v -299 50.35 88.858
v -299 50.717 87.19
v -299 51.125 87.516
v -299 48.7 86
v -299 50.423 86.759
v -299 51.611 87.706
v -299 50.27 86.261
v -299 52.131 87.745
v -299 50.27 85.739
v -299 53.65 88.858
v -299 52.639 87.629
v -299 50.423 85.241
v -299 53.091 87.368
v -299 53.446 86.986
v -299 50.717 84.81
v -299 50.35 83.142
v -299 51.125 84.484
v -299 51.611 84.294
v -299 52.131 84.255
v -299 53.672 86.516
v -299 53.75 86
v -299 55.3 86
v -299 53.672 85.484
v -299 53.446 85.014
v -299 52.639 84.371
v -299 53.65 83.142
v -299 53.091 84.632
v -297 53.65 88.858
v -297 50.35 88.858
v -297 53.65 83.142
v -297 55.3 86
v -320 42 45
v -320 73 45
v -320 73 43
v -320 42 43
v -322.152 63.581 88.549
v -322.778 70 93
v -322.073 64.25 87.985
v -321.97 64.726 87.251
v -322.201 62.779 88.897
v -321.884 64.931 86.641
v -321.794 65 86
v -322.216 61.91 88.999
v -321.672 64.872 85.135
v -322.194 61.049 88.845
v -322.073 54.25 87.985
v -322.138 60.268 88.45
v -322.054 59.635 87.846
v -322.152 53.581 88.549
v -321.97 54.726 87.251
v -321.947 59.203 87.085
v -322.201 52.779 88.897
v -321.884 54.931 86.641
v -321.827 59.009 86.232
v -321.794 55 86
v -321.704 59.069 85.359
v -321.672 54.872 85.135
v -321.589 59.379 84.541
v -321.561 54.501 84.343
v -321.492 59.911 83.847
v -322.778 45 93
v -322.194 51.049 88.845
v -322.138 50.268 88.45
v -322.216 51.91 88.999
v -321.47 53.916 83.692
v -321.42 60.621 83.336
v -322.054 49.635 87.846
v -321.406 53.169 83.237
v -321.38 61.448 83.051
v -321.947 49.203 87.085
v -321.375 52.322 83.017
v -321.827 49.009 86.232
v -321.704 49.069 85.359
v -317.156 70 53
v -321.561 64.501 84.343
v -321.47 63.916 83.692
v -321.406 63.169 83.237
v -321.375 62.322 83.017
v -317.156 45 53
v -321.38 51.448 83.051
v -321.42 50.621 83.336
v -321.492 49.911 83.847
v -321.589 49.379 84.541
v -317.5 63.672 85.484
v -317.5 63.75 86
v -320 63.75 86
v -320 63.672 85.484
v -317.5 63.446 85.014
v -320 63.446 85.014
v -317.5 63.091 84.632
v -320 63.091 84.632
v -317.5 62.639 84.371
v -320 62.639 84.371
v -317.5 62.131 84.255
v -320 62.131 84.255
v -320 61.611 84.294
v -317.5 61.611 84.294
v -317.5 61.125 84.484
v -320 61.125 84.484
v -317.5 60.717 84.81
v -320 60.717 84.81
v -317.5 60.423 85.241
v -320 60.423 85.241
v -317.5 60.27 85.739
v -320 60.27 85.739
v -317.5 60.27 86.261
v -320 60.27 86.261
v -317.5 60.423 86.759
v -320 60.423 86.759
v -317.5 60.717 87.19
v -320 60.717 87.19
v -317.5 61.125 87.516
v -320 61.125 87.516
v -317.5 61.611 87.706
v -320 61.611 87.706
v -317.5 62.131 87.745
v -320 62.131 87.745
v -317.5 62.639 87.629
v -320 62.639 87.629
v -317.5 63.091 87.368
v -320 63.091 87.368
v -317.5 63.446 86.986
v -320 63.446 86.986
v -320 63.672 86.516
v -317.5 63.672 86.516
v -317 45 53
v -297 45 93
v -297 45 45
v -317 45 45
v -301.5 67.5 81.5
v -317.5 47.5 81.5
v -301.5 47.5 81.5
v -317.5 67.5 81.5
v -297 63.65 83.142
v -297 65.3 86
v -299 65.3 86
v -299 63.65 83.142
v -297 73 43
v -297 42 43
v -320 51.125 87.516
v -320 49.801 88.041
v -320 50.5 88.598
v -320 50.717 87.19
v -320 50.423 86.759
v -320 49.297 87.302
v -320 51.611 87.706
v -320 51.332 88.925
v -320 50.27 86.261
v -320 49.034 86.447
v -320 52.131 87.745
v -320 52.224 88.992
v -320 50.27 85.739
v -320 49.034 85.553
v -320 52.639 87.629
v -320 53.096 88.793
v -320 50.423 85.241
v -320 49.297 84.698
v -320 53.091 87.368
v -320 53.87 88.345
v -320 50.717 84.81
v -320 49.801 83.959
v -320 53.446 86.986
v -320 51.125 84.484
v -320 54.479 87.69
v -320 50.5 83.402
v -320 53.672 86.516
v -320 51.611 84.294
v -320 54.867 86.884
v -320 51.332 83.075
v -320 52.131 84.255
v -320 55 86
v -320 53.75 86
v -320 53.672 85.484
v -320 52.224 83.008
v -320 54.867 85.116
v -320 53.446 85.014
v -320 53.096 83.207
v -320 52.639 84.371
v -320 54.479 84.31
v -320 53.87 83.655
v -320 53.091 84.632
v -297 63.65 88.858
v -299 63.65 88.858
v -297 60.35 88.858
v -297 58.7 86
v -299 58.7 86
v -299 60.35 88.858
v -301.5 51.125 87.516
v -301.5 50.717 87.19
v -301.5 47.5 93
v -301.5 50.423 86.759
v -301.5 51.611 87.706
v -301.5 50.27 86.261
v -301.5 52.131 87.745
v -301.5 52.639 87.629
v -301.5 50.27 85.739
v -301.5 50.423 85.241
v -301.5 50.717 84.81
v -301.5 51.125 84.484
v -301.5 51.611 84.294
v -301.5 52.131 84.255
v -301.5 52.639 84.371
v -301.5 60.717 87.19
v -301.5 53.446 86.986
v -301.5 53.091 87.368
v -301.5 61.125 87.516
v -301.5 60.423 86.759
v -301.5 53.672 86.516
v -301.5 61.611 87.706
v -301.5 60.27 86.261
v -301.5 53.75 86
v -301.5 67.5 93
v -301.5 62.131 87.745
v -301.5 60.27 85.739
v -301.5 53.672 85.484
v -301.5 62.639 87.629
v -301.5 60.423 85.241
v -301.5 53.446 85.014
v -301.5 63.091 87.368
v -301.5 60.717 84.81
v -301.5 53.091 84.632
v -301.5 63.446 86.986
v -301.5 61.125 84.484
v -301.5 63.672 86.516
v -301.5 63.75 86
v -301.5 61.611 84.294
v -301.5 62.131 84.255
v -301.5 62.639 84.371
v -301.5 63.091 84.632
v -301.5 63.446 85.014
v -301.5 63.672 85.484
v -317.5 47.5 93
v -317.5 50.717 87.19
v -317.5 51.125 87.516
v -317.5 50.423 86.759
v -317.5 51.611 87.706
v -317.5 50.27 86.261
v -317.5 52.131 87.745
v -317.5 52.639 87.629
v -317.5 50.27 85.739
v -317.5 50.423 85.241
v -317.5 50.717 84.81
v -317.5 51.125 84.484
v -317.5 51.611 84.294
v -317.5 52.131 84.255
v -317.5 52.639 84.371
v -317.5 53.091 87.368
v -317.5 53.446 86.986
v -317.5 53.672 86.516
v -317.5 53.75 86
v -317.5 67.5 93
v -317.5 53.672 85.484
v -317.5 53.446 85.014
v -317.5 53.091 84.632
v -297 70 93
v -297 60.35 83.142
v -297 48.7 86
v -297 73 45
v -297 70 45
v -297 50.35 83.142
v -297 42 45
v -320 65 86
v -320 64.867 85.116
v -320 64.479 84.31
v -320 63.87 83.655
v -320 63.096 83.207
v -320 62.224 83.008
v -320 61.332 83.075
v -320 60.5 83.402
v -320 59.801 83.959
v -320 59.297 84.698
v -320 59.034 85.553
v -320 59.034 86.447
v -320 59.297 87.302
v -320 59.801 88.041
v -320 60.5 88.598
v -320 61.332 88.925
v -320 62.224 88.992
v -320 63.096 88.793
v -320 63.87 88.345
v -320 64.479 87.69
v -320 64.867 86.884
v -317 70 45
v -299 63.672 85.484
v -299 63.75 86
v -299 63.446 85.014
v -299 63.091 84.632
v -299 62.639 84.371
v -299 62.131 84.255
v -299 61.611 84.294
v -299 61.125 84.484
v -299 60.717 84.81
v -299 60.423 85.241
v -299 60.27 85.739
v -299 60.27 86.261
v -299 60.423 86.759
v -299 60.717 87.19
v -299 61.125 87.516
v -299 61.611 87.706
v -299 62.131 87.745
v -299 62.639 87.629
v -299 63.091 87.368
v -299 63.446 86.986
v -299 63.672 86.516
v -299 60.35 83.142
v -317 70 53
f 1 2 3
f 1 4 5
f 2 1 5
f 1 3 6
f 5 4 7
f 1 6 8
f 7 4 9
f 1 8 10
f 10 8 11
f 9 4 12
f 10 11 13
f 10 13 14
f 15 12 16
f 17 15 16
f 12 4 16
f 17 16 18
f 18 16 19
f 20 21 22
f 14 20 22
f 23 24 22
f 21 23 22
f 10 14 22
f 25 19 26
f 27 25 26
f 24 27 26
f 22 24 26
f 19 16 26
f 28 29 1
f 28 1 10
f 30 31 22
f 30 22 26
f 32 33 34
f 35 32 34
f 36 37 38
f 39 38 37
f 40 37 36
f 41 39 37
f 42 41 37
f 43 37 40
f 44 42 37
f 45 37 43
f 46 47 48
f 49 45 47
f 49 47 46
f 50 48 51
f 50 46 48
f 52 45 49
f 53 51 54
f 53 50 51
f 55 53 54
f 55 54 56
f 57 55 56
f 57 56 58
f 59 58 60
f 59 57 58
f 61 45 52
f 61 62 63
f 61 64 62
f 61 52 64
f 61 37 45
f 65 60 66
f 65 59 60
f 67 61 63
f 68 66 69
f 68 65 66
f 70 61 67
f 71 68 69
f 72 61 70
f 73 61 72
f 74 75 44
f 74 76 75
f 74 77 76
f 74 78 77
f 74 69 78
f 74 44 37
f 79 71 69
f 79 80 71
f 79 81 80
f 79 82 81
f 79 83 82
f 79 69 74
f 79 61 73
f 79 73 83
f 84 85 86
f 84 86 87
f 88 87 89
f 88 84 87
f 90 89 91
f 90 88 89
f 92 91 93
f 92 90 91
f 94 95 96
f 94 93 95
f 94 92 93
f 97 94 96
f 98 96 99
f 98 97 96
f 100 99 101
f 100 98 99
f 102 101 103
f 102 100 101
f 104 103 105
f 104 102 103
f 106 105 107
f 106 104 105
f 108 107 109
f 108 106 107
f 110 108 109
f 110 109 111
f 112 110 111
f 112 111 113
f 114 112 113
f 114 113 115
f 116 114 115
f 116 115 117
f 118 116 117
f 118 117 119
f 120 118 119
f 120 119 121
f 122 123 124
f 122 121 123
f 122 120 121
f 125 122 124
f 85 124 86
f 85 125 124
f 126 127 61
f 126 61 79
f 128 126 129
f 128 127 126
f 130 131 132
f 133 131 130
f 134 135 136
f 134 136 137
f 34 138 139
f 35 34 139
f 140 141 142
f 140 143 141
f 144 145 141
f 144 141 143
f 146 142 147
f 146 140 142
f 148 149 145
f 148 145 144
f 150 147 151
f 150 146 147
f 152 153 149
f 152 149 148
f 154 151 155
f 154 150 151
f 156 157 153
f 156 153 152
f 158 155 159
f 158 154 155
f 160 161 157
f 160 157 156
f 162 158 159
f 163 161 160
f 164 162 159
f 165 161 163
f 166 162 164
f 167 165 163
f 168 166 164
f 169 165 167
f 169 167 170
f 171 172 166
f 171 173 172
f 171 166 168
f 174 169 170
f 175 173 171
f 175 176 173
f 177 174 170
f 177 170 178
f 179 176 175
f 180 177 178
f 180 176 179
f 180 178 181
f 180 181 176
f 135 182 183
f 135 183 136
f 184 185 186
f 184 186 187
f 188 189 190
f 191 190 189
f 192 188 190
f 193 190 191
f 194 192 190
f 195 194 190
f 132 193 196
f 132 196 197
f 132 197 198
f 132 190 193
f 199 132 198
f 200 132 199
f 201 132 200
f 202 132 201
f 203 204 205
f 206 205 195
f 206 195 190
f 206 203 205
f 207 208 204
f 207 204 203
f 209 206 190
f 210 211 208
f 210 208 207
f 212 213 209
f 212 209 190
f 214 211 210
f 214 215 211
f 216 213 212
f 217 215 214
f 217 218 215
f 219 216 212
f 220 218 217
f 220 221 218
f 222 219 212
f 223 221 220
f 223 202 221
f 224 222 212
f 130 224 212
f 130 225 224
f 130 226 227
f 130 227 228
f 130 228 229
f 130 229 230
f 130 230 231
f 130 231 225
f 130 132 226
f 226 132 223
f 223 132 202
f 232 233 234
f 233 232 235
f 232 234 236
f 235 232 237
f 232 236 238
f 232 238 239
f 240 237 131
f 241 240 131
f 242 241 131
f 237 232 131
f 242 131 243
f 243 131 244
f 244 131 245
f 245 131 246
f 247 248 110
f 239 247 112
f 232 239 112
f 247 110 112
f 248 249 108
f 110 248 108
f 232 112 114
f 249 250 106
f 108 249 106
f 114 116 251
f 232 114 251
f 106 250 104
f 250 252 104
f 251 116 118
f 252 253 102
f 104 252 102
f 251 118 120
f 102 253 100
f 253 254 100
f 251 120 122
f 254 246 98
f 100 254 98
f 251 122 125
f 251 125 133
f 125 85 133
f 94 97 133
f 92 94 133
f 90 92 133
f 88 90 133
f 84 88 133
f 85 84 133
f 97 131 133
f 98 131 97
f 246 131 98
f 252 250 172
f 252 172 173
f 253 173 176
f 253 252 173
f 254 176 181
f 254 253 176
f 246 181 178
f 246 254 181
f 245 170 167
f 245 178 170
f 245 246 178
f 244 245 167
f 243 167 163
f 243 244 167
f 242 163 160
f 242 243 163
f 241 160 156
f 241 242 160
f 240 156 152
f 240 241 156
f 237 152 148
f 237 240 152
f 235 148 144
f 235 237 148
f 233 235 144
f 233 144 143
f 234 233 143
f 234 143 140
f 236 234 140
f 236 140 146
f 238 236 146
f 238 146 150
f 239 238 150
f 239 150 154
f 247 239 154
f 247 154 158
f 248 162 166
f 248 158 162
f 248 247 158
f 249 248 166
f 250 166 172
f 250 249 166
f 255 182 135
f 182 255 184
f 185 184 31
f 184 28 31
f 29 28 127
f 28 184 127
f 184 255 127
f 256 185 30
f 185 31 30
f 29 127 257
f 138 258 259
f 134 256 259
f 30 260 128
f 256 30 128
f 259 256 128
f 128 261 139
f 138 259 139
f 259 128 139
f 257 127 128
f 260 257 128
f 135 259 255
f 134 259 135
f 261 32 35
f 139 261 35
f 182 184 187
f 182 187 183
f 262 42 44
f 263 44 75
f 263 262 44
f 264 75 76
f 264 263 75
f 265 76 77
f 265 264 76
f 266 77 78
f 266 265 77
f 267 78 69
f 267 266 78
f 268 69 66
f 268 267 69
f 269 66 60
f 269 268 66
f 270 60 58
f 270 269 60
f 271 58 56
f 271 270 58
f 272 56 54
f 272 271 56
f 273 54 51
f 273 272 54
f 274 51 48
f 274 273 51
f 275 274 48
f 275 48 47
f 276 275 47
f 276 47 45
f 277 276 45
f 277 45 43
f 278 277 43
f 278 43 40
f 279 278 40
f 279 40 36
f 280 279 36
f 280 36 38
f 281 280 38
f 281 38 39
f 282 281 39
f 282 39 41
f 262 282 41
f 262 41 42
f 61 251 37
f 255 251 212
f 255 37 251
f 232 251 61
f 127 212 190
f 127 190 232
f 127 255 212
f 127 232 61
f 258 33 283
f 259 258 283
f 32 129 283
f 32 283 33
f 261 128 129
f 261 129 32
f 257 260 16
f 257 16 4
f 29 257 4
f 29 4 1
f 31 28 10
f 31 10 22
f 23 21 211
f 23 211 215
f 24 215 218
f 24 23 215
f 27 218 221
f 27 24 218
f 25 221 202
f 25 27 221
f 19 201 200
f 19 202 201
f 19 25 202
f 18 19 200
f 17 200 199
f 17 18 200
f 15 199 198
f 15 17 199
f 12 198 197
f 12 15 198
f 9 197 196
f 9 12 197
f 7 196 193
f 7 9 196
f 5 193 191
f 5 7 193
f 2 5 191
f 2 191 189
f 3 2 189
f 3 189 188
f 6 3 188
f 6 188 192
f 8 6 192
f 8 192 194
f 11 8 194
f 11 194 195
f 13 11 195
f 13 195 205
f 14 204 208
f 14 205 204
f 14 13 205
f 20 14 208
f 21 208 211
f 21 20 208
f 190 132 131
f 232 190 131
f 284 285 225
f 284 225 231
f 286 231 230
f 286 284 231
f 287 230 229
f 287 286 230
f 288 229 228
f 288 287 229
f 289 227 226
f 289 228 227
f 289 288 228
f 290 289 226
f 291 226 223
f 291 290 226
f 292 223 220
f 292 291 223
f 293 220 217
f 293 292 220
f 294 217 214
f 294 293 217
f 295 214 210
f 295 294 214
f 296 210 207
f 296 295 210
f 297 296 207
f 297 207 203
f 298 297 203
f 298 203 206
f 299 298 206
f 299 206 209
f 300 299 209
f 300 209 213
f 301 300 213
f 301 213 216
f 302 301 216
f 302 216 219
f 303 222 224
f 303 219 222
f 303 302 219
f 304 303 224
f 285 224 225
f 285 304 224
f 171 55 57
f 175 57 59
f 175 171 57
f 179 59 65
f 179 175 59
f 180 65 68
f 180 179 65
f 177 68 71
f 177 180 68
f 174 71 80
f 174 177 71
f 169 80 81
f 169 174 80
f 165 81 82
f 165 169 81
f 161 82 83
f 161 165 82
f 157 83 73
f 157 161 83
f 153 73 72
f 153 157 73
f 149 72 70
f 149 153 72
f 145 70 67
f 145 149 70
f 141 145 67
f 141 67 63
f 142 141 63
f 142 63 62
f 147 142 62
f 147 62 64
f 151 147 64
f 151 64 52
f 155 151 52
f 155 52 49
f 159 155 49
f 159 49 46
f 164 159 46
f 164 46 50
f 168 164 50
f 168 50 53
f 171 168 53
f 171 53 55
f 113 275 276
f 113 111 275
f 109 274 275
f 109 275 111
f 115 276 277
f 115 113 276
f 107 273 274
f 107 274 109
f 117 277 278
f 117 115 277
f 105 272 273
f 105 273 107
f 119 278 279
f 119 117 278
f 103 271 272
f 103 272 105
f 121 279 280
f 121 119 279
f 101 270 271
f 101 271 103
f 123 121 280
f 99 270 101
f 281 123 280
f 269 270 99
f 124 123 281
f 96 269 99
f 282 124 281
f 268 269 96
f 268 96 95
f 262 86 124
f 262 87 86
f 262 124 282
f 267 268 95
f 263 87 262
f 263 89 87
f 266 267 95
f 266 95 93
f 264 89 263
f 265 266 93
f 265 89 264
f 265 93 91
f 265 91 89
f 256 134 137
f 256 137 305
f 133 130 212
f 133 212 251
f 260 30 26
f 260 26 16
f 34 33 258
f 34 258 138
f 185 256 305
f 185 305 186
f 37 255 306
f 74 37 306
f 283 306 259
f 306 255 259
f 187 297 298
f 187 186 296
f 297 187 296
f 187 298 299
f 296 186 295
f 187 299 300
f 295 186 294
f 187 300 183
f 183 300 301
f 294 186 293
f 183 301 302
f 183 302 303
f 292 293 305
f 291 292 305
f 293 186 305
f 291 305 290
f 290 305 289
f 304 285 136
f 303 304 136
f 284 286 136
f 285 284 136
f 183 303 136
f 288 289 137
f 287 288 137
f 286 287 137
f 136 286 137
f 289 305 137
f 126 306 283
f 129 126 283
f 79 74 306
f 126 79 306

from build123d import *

# Parameters (mm, degrees)
PRISM008_DEPTH            = 10
PRISM008_ROLL_ANGLE       = -90
CYLINDER111_R             = 3
CYLINDER111_DEPTH         = 32
CYLINDER111_ROLL_ANGLE    = -90
CYLINDER112_R             = 3
CYLINDER112_DEPTH         = 32
CYLINDER112_ROLL_ANGLE    = -90
BOX117_W                  = 20
BOX117_H                  = 16
BOX117_DEPTH              = 28
CYLINDER113_R             = 1.75
CYLINDER113_DEPTH         = 32
CYLINDER113_ROLL_ANGLE    = -90
CYLINDER114_R             = 1.75
CYLINDER114_DEPTH         = 32
CYLINDER114_ROLL_ANGLE    = -90
PRISM007_DEPTH            = 10
PRISM007_ROLL_ANGLE       = -90
FUSION079_ROLL_ANGLE      = 90
FUSION079_PLACEMENT_ANGLE = 180
BOX115_W                  = 2
BOX115_H                  = 23
BOX115_DEPTH              = 3
BOX110_W                  = 50
BOX110_H                  = 25
BOX110_DEPTH              = 20
BOX114_W                  = 2
BOX114_H                  = 25
BOX114_DEPTH              = 3
BOX113_W                  = 10
BOX113_H                  = 25
BOX113_DEPTH              = 10
BOX112_W                  = 30
BOX112_H                  = 30
BOX112_DEPTH              = 30
BOX112_PITCH_ANGLE        = 90
BOX111_W                  = 50
BOX111_H                  = 25
BOX111_DEPTH              = 6
BOX111_PITCH_ANGLE        = 8
FUSION077_PLACEMENT_ANGLE = -90
BOX116_W                  = 2
BOX116_H                  = 23
BOX116_DEPTH              = 3
CUT138_ROLL_ANGLE         = 90
CUT138_PLACEMENT_ANGLE    = -90


with BuildPart() as prisma008:
    # Prism008 → Prism008 (new body)
    with BuildSketch(Plane.XY):
        Polygon((3.3, 0), (1.65, 2.857884), (-1.65, 2.857884), (-3.3, 0), (-1.65, -2.857884), (1.65, -2.857884), align=None)
    extrude(amount=PRISM008_DEPTH)


with BuildPart() as prisma008_1:
    # Prism008 roll: moved
    add(prisma008.part.rotate(Axis((0, 0, 0), (1, 0, 0)), PRISM008_ROLL_ANGLE))


with BuildPart() as prisma008_2:
    # Prism008 placement: moved
    add(prisma008_1.part.moved(Location((8, 85, 84))))


with BuildPart() as cilindro038:
    # Cylinder111 → Cylinder111 (new body)
    with BuildSketch(Plane.XY):
        Circle(CYLINDER111_R)
    extrude(amount=CYLINDER111_DEPTH)


with BuildPart() as cilindro038_1:
    # Cylinder111 roll: moved
    add(cilindro038.part.rotate(Axis((0, 0, 0), (1, 0, 0)), CYLINDER111_ROLL_ANGLE))


with BuildPart() as cilindro038_2:
    # Cylinder111 placement: moved
    add(cilindro038_1.part.moved(Location((18, 116, 84))))


with BuildPart() as cilindro039:
    # Cylinder112 → Cylinder112 (new body)
    with BuildSketch(Plane.XY):
        Circle(CYLINDER112_R)
    extrude(amount=CYLINDER112_DEPTH)


with BuildPart() as cilindro039_1:
    # Cylinder112 roll: moved
    add(cilindro039.part.rotate(Axis((0, 0, 0), (1, 0, 0)), CYLINDER112_ROLL_ANGLE))


with BuildPart() as cilindro039_2:
    # Cylinder112 placement: moved
    add(cilindro039_1.part.moved(Location((8, 116, 84))))


with BuildPart() as cubo055:
    # Box117 → Box117 (new body)
    with BuildSketch(Plane(origin=(3.5, 97.5, 79.5), x_dir=(1, 0, 0), z_dir=(0, 0, 1))):
        with Locations((10, 8)):
            Rectangle(BOX117_W, BOX117_H)
    extrude(amount=BOX117_DEPTH)


with BuildPart() as cilindro040:
    # Cylinder113 → Cylinder113 (new body)
    with BuildSketch(Plane.XY):
        Circle(CYLINDER113_R)
    extrude(amount=CYLINDER113_DEPTH)


with BuildPart() as cilindro040_1:
    # Cylinder113 roll: moved
    add(cilindro040.part.rotate(Axis((0, 0, 0), (1, 0, 0)), CYLINDER113_ROLL_ANGLE))


with BuildPart() as cilindro040_2:
    # Cylinder113 placement: moved
    add(cilindro040_1.part.moved(Location((18, 90, 84))))


with BuildPart() as cilindro041:
    # Cylinder114 → Cylinder114 (new body)
    with BuildSketch(Plane.XY):
        Circle(CYLINDER114_R)
    extrude(amount=CYLINDER114_DEPTH)


with BuildPart() as cilindro041_1:
    # Cylinder114 roll: moved
    add(cilindro041.part.rotate(Axis((0, 0, 0), (1, 0, 0)), CYLINDER114_ROLL_ANGLE))


with BuildPart() as cilindro041_2:
    # Cylinder114 placement: moved
    add(cilindro041_1.part.moved(Location((8, 90, 84))))


with BuildPart() as arm_positive_cut003:
    # Prism007 → Prism007 (new body)
    with BuildSketch(Plane.XY):
        Polygon((3.3, 0), (1.65, 2.857884), (-1.65, 2.857884), (-3.3, 0), (-1.65, -2.857884), (1.65, -2.857884), align=None)
    extrude(amount=PRISM007_DEPTH)


with BuildPart() as arm_positive_cut003_1:
    # Prism007 roll: moved
    add(arm_positive_cut003.part.rotate(Axis((0, 0, 0), (1, 0, 0)), PRISM007_ROLL_ANGLE))


with BuildPart() as arm_positive_cut003_2:
    # Prism007 placement: moved
    add(arm_positive_cut003_1.part.moved(Location((18, 85, 84))))

    # Fusion079: union Prisma008, Cilindro038, Cilindro039, Cubo055, Cilindro040, Cilindro041
    add(prisma008_2.part)
    add(cilindro038_2.part)
    add(cilindro039_2.part)
    add(cubo055.part)
    add(cilindro040_2.part)
    add(cilindro041_2.part)


with BuildPart() as arm_positive_cut003_3:
    # Fusion079 roll: moved
    add(arm_positive_cut003_2.part.rotate(Axis((0, 0, 0), (1, 0, 0)), FUSION079_ROLL_ANGLE))


with BuildPart() as arm_positive_cut003_4:
    # Fusion079 placement: moved
    add(arm_positive_cut003_3.part.moved(Location((26, -91, -93))).rotate(Axis((26, -91, -93), (0, 0, 1)), FUSION079_PLACEMENT_ANGLE))


with BuildPart() as cubo053:
    # Box115 → Box115 (new body)
    with BuildSketch(Plane(origin=(0, -48, 0), x_dir=(0, -1, 0), z_dir=(-1, 0, 0))):
        with Locations((1, 11.5)):
            Rectangle(BOX115_W, BOX115_H)
    extrude(amount=BOX115_DEPTH)


with BuildPart() as cubo048:
    # Box110 → Box110 (new body)
    with BuildSketch(Plane.XY):
        with Locations((25, 12.5)):
            Rectangle(BOX110_W, BOX110_H)
    extrude(amount=BOX110_DEPTH)


with BuildPart() as cubo052:
    # Box114 → Box114 (new body)
    with BuildSketch(Plane(origin=(48, 0, 20), x_dir=(1, 0, 0), z_dir=(0, 0, 1))):
        with Locations((1, 12.5)):
            Rectangle(BOX114_W, BOX114_H)
    extrude(amount=BOX114_DEPTH)


with BuildPart() as cubo051:
    # Box113 → Box113 (new body)
    with BuildSketch(Plane(origin=(-10, 0, 16), x_dir=(1, 0, 0), z_dir=(0, 0, 1))):
        with Locations((5, 12.5)):
            Rectangle(BOX113_W, BOX113_H)
    extrude(amount=BOX113_DEPTH)


with BuildPart() as cubo050:
    # Box112 → Box112 (new body)
    with BuildSketch(Plane.XY):
        with Locations((15, 15)):
            Rectangle(BOX112_W, BOX112_H)
    extrude(amount=BOX112_DEPTH)


with BuildPart() as cubo050_1:
    # Box112 pitch: moved
    add(cubo050.part.rotate(Axis((0, 0, 0), (0, 1, 0)), BOX112_PITCH_ANGLE))


with BuildPart() as cubo050_2:
    # Box112 placement: moved
    add(cubo050_1.part.moved(Location((40, 0, 30))))


with BuildPart() as brazo002:
    # Box111 → Box111 (new body)
    with BuildSketch(Plane.XY):
        with Locations((25, 12.5)):
            Rectangle(BOX111_W, BOX111_H)
    extrude(amount=BOX111_DEPTH)


with BuildPart() as brazo002_1:
    # Box111 pitch: moved
    add(brazo002.part.rotate(Axis((0, 0, 0), (0, 1, 0)), BOX111_PITCH_ANGLE))


with BuildPart() as brazo002_2:
    # Box111 placement: moved
    add(brazo002_1.part.moved(Location((-2, 0, 20))))

    # Cut136: cut Cubo050
    add(cubo050_2.part, mode=Mode.SUBTRACT)

    # Cut137: cut Cubo051
    add(cubo051.part, mode=Mode.SUBTRACT)

    # Fusion077: union Cubo048, Cubo052
    add(cubo048.part)
    add(cubo052.part)


with BuildPart() as brazo002_3:
    # Fusion077 placement: moved
    add(brazo002_2.part.rotate(Axis((0, 0, 0), (0, 0, 1)), FUSION077_PLACEMENT_ANGLE))


with BuildPart() as cut138:
    # Box116 → Box116 (new body)
    with BuildSketch(Plane(origin=(28, -48, 0), x_dir=(0, -1, 0), z_dir=(-1, 0, 0))):
        with Locations((1, 11.5)):
            Rectangle(BOX116_W, BOX116_H)
    extrude(amount=BOX116_DEPTH)

    # Fusion078: union Cubo053, brazo002
    add(cubo053.part)
    add(brazo002_3.part)

    # Cut138: cut arm-positive-cut003
    add(arm_positive_cut003_4.part, mode=Mode.SUBTRACT)


with BuildPart() as cut138_1:
    # Cut138 roll: moved
    add(cut138.part.rotate(Axis((0, 0, 0), (1, 0, 0)), CUT138_ROLL_ANGLE))


with BuildPart() as cut138_2:
    # Cut138 placement: moved
    add(cut138_1.part.moved(Location((-297, 70, 93))).rotate(Axis((-297, 70, 93), (0, 0, 1)), CUT138_PLACEMENT_ANGLE))


solid = cut138_2.part
